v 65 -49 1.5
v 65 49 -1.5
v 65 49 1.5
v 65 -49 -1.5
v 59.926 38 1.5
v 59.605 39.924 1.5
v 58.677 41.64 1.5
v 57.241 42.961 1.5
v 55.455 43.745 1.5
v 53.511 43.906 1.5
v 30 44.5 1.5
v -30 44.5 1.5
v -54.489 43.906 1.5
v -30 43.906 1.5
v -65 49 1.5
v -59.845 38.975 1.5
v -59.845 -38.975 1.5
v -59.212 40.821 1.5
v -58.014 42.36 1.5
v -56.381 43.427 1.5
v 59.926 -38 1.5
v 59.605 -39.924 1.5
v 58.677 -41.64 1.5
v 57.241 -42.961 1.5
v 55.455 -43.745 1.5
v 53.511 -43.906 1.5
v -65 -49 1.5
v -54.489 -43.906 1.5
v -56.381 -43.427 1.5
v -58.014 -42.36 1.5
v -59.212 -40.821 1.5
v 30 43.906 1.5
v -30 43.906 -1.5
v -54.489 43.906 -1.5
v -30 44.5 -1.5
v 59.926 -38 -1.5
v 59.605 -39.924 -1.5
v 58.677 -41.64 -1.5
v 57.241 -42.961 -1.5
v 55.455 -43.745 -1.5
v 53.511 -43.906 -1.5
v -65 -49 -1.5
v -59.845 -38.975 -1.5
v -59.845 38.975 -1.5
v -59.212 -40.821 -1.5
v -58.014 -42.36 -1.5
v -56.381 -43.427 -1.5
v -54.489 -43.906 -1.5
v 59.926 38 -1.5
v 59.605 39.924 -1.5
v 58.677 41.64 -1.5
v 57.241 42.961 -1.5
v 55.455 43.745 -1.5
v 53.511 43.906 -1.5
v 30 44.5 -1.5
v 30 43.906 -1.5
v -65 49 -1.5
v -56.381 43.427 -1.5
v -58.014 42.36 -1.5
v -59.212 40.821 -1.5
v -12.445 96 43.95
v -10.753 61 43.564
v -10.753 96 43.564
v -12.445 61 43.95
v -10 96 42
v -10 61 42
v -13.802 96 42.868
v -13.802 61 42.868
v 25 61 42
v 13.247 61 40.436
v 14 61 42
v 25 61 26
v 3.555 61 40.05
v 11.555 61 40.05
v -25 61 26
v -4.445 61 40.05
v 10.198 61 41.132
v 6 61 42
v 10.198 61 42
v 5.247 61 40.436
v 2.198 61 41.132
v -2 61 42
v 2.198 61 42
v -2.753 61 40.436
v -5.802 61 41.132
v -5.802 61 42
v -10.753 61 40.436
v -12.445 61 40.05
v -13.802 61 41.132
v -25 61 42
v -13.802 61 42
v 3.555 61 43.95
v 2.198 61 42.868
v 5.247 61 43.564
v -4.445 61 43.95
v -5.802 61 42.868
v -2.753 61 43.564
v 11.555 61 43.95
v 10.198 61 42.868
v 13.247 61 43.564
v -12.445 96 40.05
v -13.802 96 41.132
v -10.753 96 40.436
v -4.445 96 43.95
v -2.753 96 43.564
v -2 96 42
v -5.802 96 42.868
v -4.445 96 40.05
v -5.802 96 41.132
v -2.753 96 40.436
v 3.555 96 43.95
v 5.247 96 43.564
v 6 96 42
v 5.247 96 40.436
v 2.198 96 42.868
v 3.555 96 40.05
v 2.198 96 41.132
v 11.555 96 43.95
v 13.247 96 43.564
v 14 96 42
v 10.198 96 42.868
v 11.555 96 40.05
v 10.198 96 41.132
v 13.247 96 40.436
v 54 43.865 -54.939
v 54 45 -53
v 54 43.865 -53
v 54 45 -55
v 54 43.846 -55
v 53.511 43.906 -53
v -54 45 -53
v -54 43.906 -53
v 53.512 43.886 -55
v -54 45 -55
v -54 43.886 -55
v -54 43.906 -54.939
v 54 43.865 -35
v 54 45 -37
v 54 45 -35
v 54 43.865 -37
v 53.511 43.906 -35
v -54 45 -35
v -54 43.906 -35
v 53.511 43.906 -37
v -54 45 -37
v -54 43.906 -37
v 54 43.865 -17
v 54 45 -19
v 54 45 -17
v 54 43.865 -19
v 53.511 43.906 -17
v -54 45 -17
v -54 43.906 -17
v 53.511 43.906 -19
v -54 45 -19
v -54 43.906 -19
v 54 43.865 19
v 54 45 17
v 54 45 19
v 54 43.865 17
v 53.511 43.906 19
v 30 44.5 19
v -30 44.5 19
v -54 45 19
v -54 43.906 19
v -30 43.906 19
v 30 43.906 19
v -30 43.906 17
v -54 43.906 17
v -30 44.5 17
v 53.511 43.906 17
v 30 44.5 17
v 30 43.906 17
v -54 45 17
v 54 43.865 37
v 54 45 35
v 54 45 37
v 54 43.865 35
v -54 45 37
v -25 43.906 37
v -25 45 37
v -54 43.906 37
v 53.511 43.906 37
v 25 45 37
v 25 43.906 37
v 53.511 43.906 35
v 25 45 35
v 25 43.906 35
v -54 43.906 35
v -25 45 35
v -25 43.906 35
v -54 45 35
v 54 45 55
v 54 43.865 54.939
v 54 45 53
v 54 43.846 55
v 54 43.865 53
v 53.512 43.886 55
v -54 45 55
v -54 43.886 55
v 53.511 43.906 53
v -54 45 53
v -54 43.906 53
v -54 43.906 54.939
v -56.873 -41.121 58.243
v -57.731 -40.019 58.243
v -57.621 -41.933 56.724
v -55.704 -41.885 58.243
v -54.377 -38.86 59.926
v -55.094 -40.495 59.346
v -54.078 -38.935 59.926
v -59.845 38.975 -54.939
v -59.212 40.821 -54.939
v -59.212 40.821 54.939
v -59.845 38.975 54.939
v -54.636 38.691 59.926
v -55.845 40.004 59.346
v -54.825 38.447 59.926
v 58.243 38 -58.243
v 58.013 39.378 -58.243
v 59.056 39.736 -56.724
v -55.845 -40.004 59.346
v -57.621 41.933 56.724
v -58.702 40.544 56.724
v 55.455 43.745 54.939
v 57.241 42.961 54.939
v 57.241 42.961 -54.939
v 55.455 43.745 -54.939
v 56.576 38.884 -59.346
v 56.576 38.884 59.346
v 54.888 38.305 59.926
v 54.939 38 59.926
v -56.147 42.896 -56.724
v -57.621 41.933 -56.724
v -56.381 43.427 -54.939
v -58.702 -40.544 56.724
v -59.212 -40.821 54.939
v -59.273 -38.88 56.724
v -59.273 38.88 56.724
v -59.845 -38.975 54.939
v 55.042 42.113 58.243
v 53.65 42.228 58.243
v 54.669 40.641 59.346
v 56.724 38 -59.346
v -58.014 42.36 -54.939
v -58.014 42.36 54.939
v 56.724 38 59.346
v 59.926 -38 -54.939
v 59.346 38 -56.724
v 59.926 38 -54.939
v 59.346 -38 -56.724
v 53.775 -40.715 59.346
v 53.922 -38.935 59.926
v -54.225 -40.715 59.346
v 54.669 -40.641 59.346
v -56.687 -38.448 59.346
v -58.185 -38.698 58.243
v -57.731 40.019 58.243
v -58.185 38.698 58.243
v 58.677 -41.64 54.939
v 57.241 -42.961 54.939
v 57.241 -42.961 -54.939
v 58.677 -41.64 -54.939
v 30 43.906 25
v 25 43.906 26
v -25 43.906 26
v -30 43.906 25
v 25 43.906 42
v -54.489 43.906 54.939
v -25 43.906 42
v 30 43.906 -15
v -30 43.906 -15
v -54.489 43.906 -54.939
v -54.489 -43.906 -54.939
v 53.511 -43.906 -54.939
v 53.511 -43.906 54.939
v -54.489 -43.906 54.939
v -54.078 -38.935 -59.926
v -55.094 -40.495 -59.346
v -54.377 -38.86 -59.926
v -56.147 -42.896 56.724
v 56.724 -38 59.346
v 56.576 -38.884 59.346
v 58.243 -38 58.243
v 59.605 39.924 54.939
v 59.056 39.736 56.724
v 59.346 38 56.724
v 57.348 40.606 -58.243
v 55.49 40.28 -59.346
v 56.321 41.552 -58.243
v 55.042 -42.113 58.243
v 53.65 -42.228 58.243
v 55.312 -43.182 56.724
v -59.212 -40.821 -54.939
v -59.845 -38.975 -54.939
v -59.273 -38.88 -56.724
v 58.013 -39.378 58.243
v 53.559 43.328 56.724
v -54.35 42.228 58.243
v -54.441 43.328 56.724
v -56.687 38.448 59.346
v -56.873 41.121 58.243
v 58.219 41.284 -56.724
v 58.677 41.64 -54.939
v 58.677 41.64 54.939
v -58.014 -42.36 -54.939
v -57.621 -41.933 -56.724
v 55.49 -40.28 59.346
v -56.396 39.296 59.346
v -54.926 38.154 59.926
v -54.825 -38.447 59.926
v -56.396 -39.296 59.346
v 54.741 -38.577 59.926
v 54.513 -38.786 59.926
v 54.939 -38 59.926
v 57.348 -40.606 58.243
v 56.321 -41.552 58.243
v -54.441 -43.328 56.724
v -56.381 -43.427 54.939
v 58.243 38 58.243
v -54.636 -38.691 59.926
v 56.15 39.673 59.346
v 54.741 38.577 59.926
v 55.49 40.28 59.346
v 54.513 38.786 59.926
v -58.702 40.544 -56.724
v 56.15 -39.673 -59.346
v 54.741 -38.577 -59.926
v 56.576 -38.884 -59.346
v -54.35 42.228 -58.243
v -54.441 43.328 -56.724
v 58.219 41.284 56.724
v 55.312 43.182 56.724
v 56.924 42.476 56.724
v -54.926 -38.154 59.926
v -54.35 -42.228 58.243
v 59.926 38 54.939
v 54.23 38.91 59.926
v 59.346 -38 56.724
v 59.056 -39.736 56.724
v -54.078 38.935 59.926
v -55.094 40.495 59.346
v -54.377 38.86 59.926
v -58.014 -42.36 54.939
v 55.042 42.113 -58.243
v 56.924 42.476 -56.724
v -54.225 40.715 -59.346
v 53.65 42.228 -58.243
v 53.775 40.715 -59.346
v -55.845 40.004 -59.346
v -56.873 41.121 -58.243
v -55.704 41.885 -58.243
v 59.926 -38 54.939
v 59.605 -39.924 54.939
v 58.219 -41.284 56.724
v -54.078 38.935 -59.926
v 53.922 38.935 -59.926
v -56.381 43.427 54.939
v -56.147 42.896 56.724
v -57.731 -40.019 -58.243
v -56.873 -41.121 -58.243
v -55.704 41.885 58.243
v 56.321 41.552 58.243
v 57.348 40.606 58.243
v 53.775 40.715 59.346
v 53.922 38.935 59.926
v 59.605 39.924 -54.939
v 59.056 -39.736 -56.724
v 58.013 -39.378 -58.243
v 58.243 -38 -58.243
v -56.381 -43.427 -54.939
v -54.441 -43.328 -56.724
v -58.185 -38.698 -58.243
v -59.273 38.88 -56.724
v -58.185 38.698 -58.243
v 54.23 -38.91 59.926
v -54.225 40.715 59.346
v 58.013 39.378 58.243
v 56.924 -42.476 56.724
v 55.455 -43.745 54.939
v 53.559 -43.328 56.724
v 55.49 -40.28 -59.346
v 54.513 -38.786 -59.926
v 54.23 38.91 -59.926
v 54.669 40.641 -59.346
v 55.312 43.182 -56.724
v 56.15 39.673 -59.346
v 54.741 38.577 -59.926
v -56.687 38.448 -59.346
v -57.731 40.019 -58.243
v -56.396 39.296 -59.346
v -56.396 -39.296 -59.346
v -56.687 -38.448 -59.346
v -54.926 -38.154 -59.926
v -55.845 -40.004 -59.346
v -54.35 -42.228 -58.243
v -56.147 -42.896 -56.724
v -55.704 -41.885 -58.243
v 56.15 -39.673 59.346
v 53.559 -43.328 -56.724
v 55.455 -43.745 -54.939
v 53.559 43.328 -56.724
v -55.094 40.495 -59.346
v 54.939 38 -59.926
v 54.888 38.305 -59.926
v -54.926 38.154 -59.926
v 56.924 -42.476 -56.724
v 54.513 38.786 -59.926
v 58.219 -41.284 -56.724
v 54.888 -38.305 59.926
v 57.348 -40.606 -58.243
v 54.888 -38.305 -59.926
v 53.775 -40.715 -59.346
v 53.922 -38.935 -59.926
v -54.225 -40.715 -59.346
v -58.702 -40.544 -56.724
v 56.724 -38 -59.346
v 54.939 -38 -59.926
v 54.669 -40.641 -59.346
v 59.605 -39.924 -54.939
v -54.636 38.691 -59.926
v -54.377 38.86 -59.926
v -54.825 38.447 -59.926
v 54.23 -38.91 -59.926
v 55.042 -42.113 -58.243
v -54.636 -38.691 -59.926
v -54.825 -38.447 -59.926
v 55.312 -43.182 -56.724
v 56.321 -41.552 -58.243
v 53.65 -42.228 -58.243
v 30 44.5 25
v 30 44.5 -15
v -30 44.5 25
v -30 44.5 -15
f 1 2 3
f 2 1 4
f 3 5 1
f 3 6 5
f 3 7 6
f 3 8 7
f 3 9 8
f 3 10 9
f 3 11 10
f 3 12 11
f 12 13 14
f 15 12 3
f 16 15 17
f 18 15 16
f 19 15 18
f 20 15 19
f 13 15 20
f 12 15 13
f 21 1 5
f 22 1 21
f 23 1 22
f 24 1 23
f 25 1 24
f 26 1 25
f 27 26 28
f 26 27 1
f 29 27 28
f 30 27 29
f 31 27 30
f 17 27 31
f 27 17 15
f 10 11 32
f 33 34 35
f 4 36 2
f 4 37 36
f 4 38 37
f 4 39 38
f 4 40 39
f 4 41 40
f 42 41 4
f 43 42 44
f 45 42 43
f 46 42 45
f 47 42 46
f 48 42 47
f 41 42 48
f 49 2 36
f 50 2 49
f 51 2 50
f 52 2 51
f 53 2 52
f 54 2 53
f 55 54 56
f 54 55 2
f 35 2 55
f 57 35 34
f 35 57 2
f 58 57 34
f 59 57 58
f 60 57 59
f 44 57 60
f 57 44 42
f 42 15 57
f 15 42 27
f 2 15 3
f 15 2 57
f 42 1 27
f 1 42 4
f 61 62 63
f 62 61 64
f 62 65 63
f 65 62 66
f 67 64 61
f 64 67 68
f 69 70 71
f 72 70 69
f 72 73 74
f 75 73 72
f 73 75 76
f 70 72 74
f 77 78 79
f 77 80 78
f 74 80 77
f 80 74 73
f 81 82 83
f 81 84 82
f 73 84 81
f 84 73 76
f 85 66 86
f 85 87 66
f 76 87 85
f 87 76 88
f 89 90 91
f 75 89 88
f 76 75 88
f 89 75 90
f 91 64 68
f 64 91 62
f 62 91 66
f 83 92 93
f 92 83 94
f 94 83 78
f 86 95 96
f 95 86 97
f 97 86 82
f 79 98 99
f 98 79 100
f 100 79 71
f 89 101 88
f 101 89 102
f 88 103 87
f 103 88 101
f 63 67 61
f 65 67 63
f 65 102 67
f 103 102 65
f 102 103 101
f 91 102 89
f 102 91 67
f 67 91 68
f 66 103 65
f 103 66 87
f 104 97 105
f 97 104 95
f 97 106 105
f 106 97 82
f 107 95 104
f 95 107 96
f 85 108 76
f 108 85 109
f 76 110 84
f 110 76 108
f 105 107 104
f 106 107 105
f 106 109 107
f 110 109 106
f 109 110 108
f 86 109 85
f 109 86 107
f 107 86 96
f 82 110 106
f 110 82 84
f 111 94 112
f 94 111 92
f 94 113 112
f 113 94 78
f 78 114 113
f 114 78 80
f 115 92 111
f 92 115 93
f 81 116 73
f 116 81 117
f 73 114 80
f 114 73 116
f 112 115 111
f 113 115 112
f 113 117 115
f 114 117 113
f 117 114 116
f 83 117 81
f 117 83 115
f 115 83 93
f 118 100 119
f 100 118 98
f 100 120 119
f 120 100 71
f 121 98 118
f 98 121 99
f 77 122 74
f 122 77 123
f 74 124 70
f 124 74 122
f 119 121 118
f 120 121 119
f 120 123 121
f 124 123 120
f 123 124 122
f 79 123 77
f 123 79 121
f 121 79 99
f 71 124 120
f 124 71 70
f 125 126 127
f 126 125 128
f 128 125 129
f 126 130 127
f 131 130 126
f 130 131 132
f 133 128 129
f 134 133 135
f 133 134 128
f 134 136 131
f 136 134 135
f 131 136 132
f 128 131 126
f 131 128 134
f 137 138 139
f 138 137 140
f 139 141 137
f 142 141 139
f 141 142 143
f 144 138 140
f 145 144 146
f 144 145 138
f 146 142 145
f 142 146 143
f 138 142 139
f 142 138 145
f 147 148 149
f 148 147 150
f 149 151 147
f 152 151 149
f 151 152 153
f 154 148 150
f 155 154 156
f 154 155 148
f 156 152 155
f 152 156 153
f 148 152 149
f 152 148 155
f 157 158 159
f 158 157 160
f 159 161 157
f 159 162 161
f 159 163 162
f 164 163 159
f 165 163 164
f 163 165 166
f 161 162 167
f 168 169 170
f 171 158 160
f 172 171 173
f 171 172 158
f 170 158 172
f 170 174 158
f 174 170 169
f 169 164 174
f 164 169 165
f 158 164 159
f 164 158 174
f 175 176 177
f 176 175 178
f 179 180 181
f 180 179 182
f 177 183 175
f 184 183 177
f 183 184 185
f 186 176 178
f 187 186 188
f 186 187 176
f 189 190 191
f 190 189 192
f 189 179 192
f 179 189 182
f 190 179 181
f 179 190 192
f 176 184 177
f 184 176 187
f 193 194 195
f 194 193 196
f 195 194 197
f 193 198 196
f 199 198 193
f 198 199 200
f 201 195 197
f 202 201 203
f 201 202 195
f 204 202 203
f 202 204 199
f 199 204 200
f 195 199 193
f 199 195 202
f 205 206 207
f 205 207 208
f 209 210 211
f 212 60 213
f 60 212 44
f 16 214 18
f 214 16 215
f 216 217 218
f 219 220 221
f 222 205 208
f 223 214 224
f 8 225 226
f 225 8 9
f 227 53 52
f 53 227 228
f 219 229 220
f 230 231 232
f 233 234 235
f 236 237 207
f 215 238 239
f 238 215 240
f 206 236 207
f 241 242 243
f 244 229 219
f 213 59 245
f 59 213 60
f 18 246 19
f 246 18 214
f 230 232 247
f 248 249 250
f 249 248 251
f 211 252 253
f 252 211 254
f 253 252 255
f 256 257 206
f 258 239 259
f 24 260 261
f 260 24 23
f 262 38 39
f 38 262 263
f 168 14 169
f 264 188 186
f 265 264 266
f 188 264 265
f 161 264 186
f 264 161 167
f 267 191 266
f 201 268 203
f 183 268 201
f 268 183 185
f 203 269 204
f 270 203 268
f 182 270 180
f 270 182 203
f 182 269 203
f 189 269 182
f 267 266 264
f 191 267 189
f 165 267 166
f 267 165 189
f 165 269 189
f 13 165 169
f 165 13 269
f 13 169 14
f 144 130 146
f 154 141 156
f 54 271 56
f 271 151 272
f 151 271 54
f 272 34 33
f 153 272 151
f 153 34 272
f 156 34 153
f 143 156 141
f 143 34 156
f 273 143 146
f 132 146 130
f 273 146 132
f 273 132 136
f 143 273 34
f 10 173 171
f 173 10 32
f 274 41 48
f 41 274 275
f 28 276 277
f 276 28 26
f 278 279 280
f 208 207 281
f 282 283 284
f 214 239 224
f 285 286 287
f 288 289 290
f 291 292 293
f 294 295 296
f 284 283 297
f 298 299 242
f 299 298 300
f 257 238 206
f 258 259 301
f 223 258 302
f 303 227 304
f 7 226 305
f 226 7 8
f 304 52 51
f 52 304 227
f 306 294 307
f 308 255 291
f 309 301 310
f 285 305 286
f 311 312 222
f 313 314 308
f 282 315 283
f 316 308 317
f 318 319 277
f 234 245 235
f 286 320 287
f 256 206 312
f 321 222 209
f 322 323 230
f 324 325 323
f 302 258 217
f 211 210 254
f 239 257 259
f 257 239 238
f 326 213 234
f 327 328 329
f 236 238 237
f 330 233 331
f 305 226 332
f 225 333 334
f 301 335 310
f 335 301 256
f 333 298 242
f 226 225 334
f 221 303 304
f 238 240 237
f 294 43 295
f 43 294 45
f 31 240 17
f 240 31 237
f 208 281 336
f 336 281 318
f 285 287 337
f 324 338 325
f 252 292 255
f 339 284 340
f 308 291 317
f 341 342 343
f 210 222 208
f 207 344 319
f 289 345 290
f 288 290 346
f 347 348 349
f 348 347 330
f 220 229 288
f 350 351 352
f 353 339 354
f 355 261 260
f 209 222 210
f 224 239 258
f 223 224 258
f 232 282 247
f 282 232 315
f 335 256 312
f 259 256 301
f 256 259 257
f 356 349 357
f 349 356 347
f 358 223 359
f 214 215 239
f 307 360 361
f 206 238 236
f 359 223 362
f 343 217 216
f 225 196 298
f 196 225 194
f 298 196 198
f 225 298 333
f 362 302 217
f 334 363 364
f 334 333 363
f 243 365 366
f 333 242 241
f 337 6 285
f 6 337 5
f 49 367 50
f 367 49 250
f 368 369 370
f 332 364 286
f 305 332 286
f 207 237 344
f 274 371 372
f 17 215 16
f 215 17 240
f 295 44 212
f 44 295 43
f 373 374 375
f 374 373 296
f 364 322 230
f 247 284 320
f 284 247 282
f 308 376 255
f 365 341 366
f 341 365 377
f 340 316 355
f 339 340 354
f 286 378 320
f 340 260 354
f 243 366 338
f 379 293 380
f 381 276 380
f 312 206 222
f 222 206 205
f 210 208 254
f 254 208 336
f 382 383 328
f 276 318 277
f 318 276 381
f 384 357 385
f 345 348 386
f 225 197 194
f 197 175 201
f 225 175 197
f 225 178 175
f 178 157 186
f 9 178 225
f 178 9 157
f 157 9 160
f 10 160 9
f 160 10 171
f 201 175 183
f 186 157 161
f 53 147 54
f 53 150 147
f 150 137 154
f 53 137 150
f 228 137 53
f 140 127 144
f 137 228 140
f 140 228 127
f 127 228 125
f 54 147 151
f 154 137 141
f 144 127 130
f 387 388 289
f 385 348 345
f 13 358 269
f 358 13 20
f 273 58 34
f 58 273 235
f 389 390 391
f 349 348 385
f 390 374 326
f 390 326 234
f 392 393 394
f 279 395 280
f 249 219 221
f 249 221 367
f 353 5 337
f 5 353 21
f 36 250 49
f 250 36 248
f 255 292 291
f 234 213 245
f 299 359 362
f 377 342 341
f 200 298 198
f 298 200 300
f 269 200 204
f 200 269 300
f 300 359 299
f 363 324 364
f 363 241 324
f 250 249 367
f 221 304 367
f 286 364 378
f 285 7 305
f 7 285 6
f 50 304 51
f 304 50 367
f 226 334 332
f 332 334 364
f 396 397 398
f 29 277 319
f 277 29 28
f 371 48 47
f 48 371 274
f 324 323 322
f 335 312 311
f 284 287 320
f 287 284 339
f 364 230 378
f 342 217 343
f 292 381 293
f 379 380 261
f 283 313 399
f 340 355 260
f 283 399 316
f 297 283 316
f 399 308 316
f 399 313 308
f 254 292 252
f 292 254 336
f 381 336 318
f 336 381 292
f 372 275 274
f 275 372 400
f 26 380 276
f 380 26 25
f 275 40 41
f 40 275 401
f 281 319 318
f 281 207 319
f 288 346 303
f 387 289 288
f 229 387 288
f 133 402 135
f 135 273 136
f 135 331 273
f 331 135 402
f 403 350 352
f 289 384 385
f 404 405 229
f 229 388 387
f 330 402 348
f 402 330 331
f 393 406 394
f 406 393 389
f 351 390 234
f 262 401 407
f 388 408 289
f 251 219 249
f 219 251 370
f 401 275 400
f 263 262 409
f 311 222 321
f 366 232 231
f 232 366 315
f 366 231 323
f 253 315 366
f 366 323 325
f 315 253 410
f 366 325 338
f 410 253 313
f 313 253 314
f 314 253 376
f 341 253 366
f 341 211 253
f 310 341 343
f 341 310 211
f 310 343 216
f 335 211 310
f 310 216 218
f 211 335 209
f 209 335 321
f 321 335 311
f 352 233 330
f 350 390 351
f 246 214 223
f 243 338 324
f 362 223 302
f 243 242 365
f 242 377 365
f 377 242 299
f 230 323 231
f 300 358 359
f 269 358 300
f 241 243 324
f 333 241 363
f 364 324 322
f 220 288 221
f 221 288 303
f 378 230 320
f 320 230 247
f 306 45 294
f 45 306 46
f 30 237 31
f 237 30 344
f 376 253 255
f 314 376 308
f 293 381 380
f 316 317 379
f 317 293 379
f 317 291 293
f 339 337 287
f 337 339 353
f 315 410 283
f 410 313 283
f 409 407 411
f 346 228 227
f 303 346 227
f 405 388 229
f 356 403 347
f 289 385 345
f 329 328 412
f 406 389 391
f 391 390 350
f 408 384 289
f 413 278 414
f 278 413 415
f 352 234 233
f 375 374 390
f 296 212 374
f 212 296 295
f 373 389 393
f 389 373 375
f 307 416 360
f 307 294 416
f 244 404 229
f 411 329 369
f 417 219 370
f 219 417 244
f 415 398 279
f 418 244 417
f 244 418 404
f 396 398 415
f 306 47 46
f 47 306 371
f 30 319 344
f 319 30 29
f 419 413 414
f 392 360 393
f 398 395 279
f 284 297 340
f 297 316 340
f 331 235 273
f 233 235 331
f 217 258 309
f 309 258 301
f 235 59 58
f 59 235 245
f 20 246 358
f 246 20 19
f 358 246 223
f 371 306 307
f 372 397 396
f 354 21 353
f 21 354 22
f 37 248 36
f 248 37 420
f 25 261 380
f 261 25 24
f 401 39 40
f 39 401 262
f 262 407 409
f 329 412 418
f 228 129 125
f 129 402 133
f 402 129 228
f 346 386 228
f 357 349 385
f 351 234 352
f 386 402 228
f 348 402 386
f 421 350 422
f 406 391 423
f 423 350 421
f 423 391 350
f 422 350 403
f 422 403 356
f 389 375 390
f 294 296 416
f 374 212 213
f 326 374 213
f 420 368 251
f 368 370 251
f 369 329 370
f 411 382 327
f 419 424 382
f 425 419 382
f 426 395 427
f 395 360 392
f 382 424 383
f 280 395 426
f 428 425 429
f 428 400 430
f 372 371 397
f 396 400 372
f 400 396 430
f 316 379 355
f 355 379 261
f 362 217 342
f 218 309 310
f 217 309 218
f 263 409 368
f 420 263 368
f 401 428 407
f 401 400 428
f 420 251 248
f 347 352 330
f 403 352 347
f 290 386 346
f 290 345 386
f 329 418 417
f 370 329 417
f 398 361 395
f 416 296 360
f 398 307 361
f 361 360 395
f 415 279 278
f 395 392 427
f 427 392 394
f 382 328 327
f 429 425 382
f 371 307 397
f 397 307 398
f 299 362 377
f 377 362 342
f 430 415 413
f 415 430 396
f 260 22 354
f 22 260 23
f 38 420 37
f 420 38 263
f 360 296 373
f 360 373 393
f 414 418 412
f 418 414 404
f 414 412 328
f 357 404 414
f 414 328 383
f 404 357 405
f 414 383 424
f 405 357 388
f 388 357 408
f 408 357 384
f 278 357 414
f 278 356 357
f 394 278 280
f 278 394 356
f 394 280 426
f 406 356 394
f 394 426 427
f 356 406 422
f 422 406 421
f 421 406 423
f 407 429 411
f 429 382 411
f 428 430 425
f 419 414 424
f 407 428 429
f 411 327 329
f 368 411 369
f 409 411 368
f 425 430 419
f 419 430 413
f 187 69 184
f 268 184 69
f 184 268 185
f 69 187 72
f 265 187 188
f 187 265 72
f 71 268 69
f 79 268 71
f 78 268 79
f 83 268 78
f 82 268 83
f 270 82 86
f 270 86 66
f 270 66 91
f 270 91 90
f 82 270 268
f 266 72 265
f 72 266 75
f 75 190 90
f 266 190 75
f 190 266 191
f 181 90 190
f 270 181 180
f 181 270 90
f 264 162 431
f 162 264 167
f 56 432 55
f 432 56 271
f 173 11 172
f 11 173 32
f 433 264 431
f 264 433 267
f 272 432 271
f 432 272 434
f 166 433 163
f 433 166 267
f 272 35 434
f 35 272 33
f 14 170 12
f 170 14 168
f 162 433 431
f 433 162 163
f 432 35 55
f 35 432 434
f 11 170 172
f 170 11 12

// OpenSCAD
// Parameters
body_L = 120; //[60:240:1]
body_W = 88; //[44:176:1]
body_H = 120; //[60:240:1]
base_thk = 3; //[1.5:6:0.5]
base_overhang = 5; //[2:12:1]
mount_hole_d = 6.5; //[3:10:0.5]
mount_hole_spacing_L = 90; //[45:180:1]
mount_hole_spacing_W = 60; //[30:120:1]
overlap = 1; //[0.5:2:0.5]
fillet_r = 6; //[2:12:1]
lam_rib_thk = 2; //[1:4:0.5]
lam_rib_depth = 1.5; //[0.5:4:0.5]
lam_rib_count = 7; //[3:15:1]
terminal_L = 50; //[25:100:1]
terminal_W = 18; //[10:40:1]
terminal_H = 16; //[8:30:1]
terminal_offset_from_top = 18; //[8:40:1]
wire_d = 4; //[2:8:0.5]
wire_len = 35; //[15:80:1]
wire_count = 4; //[2:8:1]
wire_spacing = 8; //[4:16:1]
label_L = 60; //[30:120:1]
label_W = 40; //[20:88:1]
label_thk = 1.5; //[0.8:4:0.1]
label_offset_from_top = 35; //[10:70:1]

// Transformer Body with Fillets
module transformer_body_fillet() {
  minkowski() {
    cube([body_L - 2*fillet_r, body_W - 2*fillet_r, body_H - 2*fillet_r], center=true);
    sphere(r=fillet_r, center=true);
  }
}

// Mounting Base with Holes
module mounting_base_with_holes() {
  difference() {
    cube([body_L + 2*base_overhang, body_W + 2*base_overhang, base_thk], center=true);
    for (x = [-1, 1])
      for (y = [-1, 1])
        translate([x * mount_hole_spacing_L/2, y * mount_hole_spacing_W/2, 0])
          cylinder(r=mount_hole_d/2, h=base_thk + 2*overlap, center=true);
  }
}

// Lamination Ribs
module lamination_detail() {
  union() {
    for (i = [0:lam_rib_count-1]) {
      translate([0, body_W/2 - lam_rib_depth/2 + overlap, -(lam_rib_count-1)/2 * (body_H - 2*fillet_r)/(lam_rib_count-1) + i*(body_H - 2*fillet_r)/(lam_rib_count-1)])
        cube([body_L - 2*fillet_r, lam_rib_depth, lam_rib_thk], center=true);
    }
  }
}

// Wire Leads
module wire_leads() {
  union() {
    for (i = [-1.5, -0.5, 0.5, 1.5]) {
      translate([i * wire_spacing, body_W/2 + terminal_W + wire_len/2 - overlap, body_H/2 - terminal_offset_from_top])
        rotate([90, 0, 0])
          cylinder(r=wire_d/2, h=wire_len, center=true);
    }
  }
}

// Terminal Block
module terminal_block() {
  translate([0, body_W/2 + terminal_W/2 - overlap, body_H/2 - terminal_offset_from_top - terminal_H/2])
    cube([terminal_L, terminal_W, terminal_H], center=true);
}

// Label Plate
module label_plate() {
  translate([0, body_W/2 + label_thk/2 - overlap, body_H/2 - label_offset_from_top - label_W/2])
    cube([label_L, label_thk, label_W], center=true);
}

// Complete Transformer
module transformer_complete_union() {
  union() {
    mounting_base_with_holes();
    transformer_body_fillet();
    terminal_block();
    wire_leads();
    lamination_detail();
    label_plate();
  }
}

// Final Output
transformer_complete_union();
